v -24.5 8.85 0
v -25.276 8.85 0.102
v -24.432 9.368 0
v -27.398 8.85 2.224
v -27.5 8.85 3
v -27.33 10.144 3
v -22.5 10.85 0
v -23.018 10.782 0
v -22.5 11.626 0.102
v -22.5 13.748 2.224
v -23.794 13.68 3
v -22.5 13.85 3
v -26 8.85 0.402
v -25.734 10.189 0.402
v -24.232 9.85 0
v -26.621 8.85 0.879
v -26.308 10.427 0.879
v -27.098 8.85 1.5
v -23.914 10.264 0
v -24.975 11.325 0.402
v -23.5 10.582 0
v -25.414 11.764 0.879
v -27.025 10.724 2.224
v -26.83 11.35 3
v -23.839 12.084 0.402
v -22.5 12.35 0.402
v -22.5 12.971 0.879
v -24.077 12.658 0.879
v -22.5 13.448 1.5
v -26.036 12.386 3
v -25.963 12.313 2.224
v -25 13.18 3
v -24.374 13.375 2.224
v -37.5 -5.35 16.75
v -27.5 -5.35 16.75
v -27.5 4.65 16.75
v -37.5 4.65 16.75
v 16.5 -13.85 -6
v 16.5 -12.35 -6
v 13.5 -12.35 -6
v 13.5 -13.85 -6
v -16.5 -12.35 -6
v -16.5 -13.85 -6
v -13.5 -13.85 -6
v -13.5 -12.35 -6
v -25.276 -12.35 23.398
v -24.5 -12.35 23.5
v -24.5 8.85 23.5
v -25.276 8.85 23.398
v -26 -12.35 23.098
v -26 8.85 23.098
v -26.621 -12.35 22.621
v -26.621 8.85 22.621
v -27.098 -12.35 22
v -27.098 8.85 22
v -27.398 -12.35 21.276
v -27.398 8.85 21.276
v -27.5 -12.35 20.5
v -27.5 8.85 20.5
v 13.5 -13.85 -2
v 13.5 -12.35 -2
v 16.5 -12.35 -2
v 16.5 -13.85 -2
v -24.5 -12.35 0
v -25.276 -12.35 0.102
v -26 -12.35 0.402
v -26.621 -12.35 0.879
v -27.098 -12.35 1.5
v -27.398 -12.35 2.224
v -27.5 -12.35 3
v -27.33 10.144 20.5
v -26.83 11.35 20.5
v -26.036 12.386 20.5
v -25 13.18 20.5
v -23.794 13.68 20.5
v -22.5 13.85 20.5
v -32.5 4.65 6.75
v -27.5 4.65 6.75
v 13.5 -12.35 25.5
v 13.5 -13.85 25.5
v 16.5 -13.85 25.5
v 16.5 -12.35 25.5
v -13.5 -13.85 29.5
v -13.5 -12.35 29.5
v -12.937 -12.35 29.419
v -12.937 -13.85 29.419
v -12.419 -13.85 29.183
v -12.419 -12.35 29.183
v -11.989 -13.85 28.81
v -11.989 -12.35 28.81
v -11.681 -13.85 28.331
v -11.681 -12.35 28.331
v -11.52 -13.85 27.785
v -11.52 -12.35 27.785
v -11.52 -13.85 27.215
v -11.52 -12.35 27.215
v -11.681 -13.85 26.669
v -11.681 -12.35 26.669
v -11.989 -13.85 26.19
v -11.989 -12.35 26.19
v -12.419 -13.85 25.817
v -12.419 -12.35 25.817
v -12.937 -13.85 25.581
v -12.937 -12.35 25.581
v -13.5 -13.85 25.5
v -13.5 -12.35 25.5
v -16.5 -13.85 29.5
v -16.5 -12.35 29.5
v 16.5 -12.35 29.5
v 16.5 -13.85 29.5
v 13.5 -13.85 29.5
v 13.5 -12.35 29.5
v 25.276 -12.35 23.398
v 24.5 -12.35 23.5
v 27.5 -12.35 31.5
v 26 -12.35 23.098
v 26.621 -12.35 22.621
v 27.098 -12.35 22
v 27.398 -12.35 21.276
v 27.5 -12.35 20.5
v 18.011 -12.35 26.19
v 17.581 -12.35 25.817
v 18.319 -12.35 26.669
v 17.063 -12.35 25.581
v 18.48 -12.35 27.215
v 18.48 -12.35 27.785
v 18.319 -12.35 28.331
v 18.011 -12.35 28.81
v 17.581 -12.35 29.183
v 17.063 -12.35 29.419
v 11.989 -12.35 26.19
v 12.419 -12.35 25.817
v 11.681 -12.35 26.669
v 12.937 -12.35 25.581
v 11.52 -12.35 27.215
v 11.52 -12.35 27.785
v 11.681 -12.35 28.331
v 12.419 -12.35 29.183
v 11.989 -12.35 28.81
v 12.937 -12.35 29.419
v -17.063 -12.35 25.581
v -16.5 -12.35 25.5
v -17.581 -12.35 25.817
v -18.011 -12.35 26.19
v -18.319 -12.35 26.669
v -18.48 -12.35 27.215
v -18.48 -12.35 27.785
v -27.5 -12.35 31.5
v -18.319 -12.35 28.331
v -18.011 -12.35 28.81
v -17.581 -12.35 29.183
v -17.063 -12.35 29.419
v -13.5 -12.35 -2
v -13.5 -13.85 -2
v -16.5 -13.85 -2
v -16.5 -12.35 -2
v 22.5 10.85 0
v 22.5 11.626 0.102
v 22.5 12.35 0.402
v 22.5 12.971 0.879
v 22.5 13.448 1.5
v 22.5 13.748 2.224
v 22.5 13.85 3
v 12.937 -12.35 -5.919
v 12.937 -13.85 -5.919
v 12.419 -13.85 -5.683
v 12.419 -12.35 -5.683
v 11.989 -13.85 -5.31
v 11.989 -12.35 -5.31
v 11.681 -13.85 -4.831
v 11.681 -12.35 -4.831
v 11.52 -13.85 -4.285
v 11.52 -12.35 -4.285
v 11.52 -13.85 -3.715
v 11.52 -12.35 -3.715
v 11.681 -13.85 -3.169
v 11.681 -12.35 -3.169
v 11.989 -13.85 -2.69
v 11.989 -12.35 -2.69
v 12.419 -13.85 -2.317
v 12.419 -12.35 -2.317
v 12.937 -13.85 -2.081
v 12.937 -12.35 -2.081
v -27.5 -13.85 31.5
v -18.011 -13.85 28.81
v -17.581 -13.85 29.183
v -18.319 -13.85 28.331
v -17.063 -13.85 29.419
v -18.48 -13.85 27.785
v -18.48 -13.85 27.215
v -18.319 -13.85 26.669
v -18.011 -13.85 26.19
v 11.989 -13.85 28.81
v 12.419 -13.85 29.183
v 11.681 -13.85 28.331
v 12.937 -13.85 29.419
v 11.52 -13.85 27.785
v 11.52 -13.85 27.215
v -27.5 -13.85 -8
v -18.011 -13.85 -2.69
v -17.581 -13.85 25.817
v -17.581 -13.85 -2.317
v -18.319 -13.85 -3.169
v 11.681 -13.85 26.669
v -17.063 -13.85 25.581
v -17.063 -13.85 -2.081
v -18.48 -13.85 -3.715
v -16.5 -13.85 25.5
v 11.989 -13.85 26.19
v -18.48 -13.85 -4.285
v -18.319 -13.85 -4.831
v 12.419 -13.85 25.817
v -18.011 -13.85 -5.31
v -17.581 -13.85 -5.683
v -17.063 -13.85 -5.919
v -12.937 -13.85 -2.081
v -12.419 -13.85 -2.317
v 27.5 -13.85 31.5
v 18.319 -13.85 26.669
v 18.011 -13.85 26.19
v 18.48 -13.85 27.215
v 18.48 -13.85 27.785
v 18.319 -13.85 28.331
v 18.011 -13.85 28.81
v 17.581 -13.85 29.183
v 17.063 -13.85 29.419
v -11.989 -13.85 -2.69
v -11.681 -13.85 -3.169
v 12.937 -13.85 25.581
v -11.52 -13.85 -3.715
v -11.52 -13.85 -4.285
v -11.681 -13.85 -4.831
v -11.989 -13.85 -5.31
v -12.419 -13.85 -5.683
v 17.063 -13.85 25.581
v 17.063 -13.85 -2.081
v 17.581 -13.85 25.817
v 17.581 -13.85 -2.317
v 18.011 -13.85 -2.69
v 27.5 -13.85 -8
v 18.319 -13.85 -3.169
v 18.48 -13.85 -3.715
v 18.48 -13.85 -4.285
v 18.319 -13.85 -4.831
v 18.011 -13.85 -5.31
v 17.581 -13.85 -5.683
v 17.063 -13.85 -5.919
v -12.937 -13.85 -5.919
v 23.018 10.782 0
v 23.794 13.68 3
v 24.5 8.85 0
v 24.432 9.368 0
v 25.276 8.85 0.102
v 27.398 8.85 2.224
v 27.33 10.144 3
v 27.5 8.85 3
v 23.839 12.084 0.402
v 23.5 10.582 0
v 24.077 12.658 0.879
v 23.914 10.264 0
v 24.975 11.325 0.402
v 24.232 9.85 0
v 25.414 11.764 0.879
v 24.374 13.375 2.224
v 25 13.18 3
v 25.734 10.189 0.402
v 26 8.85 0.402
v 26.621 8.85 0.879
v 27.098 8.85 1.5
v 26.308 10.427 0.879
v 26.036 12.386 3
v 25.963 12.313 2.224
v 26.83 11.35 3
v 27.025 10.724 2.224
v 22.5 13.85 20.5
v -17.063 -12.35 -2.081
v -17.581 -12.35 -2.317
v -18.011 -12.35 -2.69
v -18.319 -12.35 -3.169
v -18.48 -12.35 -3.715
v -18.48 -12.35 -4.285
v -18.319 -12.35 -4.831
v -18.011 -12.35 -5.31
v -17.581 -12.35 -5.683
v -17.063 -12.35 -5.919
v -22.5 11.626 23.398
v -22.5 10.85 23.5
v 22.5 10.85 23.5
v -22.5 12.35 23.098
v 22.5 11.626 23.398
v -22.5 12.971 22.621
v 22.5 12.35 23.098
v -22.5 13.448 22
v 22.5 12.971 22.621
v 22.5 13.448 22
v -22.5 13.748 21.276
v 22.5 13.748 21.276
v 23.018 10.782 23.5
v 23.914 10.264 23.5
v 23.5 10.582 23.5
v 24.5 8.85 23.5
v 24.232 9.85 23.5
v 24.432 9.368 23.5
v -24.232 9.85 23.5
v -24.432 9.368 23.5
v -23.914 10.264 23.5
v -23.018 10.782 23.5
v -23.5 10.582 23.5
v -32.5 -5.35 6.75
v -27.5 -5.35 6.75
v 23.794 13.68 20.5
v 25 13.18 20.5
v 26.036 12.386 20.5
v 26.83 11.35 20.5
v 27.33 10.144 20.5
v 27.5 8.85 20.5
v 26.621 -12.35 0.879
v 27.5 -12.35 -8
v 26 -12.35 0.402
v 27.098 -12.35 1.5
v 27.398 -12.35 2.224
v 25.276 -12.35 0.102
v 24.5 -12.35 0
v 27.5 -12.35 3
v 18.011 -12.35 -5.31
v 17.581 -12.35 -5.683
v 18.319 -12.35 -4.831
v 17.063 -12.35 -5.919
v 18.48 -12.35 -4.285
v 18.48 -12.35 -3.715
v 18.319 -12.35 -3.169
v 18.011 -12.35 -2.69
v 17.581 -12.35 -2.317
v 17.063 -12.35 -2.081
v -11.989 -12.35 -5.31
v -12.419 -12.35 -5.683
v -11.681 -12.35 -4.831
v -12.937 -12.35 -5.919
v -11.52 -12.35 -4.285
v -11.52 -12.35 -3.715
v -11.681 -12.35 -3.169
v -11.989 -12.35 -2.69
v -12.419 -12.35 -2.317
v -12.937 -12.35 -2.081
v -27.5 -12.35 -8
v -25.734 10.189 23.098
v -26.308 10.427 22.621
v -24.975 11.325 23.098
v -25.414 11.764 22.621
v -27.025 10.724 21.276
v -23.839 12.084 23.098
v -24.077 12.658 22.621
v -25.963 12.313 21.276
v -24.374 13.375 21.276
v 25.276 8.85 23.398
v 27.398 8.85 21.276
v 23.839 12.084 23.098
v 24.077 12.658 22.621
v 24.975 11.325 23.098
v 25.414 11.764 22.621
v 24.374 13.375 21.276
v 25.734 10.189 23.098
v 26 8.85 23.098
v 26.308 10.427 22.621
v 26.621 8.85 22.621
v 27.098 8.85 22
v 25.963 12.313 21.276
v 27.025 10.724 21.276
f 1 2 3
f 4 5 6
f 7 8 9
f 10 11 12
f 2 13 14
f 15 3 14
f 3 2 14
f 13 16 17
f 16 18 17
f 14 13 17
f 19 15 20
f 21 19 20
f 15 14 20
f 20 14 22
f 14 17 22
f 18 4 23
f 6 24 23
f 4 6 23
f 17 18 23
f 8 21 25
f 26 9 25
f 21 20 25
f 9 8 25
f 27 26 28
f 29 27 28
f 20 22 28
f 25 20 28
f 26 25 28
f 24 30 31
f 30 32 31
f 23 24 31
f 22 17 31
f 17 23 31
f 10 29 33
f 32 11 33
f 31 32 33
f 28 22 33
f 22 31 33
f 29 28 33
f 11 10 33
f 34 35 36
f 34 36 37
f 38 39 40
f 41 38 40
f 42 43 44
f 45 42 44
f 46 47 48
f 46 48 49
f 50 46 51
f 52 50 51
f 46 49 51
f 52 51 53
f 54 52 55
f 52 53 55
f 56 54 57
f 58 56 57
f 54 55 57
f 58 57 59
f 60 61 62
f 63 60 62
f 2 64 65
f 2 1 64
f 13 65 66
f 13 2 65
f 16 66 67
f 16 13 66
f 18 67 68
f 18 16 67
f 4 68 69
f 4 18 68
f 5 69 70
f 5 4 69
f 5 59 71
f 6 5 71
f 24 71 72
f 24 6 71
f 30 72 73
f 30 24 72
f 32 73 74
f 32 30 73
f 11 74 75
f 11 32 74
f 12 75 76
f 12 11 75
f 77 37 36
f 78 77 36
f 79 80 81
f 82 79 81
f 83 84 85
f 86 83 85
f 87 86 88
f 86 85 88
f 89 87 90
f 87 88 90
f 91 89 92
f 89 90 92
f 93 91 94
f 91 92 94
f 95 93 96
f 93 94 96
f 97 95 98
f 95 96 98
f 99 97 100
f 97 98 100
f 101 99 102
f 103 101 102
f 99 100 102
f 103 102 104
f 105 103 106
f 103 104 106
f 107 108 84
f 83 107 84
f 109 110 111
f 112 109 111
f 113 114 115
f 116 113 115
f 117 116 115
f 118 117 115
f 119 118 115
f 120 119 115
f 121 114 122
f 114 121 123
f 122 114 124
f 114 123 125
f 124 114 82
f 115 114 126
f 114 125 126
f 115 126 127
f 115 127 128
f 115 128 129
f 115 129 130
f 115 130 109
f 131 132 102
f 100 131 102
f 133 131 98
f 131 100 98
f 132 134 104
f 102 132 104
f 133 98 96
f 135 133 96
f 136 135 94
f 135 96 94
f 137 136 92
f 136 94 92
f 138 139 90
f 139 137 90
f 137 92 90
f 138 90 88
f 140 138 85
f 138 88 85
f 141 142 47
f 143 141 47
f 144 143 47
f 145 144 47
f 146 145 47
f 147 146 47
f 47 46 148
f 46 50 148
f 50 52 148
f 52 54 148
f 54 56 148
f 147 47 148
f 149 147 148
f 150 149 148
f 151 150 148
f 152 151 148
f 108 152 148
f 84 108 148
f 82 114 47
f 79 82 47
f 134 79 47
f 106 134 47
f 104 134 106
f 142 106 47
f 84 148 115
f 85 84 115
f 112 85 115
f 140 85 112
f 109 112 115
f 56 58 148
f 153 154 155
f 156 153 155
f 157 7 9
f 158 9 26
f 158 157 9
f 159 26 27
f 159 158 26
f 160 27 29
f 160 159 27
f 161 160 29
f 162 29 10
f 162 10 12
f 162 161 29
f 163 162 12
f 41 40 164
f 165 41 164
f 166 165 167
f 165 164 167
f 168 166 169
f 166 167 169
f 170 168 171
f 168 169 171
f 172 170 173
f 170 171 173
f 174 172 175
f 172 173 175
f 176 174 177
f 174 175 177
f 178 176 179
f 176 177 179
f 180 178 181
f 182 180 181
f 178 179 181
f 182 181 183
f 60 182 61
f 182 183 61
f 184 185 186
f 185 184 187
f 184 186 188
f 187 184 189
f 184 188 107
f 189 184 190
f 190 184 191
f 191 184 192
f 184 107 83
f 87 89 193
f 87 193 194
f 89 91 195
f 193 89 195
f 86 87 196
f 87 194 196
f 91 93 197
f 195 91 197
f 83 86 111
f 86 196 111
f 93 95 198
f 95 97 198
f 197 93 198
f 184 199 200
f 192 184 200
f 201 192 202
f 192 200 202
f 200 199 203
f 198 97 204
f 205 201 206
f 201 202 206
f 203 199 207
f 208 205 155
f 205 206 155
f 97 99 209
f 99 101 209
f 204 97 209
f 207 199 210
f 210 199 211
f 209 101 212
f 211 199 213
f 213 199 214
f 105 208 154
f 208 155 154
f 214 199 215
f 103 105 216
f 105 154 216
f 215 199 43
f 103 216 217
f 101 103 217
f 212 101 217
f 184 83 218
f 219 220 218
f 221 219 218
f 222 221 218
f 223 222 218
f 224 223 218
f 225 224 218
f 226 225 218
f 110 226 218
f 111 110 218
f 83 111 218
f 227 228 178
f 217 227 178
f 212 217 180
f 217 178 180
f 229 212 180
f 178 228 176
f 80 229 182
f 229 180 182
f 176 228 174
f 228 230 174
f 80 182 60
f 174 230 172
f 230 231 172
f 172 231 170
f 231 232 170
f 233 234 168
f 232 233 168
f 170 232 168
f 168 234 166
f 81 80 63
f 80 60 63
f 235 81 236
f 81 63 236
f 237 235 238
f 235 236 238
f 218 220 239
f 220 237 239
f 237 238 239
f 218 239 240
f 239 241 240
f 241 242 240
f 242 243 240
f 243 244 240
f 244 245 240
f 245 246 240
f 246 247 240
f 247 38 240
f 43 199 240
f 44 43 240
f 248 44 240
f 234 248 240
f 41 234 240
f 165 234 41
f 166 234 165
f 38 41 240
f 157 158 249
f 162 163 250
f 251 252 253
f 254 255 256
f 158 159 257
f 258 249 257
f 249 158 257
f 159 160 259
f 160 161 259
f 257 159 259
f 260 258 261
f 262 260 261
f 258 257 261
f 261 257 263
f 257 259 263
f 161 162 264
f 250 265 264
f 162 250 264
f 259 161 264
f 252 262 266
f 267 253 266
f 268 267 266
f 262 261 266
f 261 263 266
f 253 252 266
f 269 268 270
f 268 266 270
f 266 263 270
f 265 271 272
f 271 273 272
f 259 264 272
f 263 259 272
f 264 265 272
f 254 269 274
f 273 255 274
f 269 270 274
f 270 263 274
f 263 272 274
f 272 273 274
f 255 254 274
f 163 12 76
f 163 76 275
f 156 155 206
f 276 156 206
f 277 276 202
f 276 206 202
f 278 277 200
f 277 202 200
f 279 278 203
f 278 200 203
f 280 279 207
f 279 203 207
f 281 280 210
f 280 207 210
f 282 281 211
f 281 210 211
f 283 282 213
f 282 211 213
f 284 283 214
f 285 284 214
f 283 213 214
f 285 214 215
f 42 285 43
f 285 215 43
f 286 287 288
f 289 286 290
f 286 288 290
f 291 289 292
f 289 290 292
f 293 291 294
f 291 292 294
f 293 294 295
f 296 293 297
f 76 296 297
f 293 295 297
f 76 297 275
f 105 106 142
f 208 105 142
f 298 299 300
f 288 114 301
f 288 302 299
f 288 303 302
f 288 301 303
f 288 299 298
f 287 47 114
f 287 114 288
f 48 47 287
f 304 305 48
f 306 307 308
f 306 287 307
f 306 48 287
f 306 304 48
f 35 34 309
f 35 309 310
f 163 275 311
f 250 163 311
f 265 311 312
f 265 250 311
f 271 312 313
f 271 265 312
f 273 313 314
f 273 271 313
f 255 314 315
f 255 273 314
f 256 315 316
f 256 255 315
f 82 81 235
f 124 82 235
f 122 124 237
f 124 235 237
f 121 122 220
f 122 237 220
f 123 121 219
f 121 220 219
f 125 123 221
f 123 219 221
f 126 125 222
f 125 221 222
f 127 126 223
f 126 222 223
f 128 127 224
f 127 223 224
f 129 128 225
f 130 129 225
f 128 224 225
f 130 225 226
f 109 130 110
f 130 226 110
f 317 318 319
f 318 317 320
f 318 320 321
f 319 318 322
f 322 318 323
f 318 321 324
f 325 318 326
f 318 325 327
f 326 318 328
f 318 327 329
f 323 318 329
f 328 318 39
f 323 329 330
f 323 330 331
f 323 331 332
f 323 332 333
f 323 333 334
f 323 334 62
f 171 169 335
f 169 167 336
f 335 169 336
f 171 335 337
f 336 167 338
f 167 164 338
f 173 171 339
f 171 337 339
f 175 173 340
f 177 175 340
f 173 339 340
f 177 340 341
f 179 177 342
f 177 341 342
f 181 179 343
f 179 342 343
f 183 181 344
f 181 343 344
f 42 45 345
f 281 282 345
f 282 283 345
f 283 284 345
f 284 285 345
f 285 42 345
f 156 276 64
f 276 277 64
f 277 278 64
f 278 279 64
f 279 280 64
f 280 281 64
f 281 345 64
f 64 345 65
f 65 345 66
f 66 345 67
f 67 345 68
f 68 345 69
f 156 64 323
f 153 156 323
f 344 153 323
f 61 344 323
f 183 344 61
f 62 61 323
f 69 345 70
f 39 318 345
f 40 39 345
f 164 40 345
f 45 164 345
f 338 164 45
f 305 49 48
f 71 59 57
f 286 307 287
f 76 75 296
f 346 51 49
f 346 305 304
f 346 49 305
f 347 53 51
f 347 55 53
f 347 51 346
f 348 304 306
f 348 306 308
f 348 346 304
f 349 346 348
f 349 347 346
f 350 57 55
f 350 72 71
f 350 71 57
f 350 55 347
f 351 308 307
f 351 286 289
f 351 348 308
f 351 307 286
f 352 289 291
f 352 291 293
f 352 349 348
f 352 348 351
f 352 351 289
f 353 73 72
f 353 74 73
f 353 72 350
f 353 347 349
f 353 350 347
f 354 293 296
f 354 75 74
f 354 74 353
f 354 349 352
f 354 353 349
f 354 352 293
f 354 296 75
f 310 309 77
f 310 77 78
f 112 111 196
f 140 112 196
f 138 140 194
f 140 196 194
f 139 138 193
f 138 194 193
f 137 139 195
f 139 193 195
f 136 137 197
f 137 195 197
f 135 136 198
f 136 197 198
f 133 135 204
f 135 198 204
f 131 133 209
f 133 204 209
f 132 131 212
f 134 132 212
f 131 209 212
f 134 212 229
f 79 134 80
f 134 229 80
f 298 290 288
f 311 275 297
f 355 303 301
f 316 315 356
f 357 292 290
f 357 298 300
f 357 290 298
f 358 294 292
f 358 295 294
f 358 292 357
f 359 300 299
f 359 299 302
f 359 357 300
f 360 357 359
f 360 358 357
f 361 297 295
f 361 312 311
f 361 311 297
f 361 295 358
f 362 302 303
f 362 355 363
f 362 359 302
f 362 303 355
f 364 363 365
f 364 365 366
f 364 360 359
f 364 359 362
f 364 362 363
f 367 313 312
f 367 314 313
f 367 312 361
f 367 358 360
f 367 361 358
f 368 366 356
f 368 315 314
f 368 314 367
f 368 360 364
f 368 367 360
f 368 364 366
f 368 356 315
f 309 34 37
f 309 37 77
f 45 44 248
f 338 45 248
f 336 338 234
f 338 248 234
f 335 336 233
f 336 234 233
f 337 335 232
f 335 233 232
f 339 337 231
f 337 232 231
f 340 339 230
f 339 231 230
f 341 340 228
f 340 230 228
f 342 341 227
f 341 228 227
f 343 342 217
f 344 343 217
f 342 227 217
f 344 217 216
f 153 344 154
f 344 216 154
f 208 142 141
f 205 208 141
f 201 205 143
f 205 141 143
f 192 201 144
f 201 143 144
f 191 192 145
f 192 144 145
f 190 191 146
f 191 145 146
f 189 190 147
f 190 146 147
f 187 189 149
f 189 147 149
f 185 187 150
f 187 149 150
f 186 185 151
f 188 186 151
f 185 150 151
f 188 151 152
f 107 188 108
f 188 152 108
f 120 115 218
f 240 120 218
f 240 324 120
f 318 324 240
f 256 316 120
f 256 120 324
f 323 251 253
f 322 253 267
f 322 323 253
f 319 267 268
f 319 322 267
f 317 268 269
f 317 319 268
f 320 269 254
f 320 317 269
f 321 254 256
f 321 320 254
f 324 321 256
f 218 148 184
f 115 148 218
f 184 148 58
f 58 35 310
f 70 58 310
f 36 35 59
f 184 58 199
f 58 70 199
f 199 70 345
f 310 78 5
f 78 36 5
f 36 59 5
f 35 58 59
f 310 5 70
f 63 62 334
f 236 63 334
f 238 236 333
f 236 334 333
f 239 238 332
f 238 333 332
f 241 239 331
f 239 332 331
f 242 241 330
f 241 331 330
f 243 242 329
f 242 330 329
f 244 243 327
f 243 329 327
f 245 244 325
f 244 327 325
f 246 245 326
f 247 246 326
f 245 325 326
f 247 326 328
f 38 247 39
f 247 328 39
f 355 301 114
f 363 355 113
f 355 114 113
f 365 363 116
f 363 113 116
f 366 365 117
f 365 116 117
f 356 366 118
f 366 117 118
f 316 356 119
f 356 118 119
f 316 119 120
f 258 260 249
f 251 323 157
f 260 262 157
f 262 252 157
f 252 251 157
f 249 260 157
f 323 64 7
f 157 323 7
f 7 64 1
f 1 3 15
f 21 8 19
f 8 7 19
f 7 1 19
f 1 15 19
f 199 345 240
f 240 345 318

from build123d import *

# Parameters (mm, degrees)
SKETCH1_W           = 55
SKETCH1_H           = 39.5
BOSS_EXTRUDE1_DEPTH = 27.7
SKETCH2_W           = 8
SKETCH2_H           = 26.2
CUT_EXTRUDE1_DEPTH  = 65.877365082
SKETCH3_W           = 8
SKETCH3_H           = 26.2
CUT_EXTRUDE2_DEPTH  = 65.877365082
CUT_EXTRUDE3_DEPTH  = 50.345111207
CUT_EXTRUDE4_DEPTH  = 51.15765146
CUT_EXTRUDE5_DEPTH  = 50.345111207
CUT_EXTRUDE6_DEPTH  = 51.15765146
BOSS_EXTRUDE2_DEPTH = 10
FILLET1_R           = 5
FILLET2_R           = 3


with BuildPart() as part:
    # Sketch1 → Boss-Extrude1 (new body)
    with BuildSketch(Plane(origin=(0, 13.85, 0), x_dir=(1, 0, 0), z_dir=(0, 1, 0))):
        with Locations((0, -11.75)):
            Rectangle(SKETCH1_W, SKETCH1_H)
    extrude(amount=-BOSS_EXTRUDE1_DEPTH)

    # Sketch2 → Cut-Extrude1 (cut, through all)
    with BuildSketch(Plane.ZY.offset(27.5)):
        with Locations((27.5, 0.75)):
            Rectangle(SKETCH2_W, SKETCH2_H)
    extrude(amount=-CUT_EXTRUDE1_DEPTH, mode=Mode.SUBTRACT)

    # Sketch3 → Cut-Extrude2 (cut, through all)
    with BuildSketch(Plane.ZY.offset(27.5)):
        with Locations((-4, 0.75)):
            Rectangle(SKETCH3_W, SKETCH3_H)
    extrude(amount=-CUT_EXTRUDE2_DEPTH, mode=Mode.SUBTRACT)

    # Sketch4 → Cut-Extrude3 (cut, through all)
    with BuildSketch(Plane(origin=(0, -12.35, 0), x_dir=(-1, 0, 0), z_dir=(0, 1, 0))):
        with BuildLine():
            Line((-13.5, -2), (-16.5, -2))
            ThreePointArc((-16.5, -2), (-18.5, -4), (-16.5, -6))
            Line((-16.5, -6), (-13.5, -6))
            ThreePointArc((-13.5, -6), (-11.5, -4), (-13.5, -2))
        make_face()
    extrude(amount=-CUT_EXTRUDE3_DEPTH, mode=Mode.SUBTRACT)

    # Sketch5 → Cut-Extrude4 (cut, through all)
    with BuildSketch(Plane.XZ.offset(13.85)):
        with BuildLine():
            Line((-16.5, -6), (-13.5, -6))
            ThreePointArc((-13.5, -6), (-11.5, -4), (-13.5, -2))
            Line((-13.5, -2), (-16.5, -2))
            ThreePointArc((-16.5, -2), (-18.5, -4), (-16.5, -6))
        make_face()
    extrude(amount=-CUT_EXTRUDE4_DEPTH, mode=Mode.SUBTRACT)

    # Sketch6 → Cut-Extrude5 (cut, through all)
    with BuildSketch(Plane(origin=(0, -12.35, 0), x_dir=(-1, 0, 0), z_dir=(0, 1, 0))):
        with BuildLine():
            Line((16.5, 29.5), (13.5, 29.5))
            ThreePointArc((13.5, 29.5), (11.5, 27.5), (13.5, 25.5))
            Line((13.5, 25.5), (16.5, 25.5))
            ThreePointArc((16.5, 25.5), (18.5, 27.5), (16.5, 29.5))
        make_face()
    extrude(amount=-CUT_EXTRUDE5_DEPTH, mode=Mode.SUBTRACT)

    # Sketch7 → Cut-Extrude6 (cut, through all)
    with BuildSketch(Plane.XZ.offset(13.85)):
        with BuildLine():
            Line((13.5, 25.5), (16.5, 25.5))
            ThreePointArc((16.5, 25.5), (18.5, 27.5), (16.5, 29.5))
            Line((16.5, 29.5), (13.5, 29.5))
            ThreePointArc((13.5, 29.5), (11.5, 27.5), (13.5, 25.5))
        make_face()
    extrude(amount=-CUT_EXTRUDE6_DEPTH, mode=Mode.SUBTRACT)

    # Sketch8 → Boss-Extrude2 (add)
    with BuildSketch(Plane.XZ.offset(5.35)):
        Polygon((-37.5, 16.75), (-32.5, 6.75), (-27.5, 6.75), (-27.5, 16.75), align=None)
    extrude(amount=-BOSS_EXTRUDE2_DEPTH)

    # Fillet1
    fillet1_edges = [part.edges().sort_by_distance(p)[0] for p in [
        (27.5, 13.85, 11.75),
        (-27.5, 13.85, 11.75),
    ]]
    fillet(fillet1_edges, radius=FILLET1_R)

    # Fillet2
    fillet2_edges = [part.edges().sort_by_distance(p)[0] for p in [
        (0, 13.85, 0),
        (0, 13.85, 23.5),
        (-26.035533906, 12.385533906, 0),
        (26.035533906, 12.385533906, 0),
        (27.5, -1.75, 23.5),
        (-27.5, -1.75, 23.5),
        (-26.035533906, 12.385533906, 23.5),
        (26.035533906, 12.385533906, 23.5),
        (27.5, -1.75, 0),
        (-27.5, -1.75, 0),
    ]]
    fillet(fillet2_edges, radius=FILLET2_R)


solid = part.part
